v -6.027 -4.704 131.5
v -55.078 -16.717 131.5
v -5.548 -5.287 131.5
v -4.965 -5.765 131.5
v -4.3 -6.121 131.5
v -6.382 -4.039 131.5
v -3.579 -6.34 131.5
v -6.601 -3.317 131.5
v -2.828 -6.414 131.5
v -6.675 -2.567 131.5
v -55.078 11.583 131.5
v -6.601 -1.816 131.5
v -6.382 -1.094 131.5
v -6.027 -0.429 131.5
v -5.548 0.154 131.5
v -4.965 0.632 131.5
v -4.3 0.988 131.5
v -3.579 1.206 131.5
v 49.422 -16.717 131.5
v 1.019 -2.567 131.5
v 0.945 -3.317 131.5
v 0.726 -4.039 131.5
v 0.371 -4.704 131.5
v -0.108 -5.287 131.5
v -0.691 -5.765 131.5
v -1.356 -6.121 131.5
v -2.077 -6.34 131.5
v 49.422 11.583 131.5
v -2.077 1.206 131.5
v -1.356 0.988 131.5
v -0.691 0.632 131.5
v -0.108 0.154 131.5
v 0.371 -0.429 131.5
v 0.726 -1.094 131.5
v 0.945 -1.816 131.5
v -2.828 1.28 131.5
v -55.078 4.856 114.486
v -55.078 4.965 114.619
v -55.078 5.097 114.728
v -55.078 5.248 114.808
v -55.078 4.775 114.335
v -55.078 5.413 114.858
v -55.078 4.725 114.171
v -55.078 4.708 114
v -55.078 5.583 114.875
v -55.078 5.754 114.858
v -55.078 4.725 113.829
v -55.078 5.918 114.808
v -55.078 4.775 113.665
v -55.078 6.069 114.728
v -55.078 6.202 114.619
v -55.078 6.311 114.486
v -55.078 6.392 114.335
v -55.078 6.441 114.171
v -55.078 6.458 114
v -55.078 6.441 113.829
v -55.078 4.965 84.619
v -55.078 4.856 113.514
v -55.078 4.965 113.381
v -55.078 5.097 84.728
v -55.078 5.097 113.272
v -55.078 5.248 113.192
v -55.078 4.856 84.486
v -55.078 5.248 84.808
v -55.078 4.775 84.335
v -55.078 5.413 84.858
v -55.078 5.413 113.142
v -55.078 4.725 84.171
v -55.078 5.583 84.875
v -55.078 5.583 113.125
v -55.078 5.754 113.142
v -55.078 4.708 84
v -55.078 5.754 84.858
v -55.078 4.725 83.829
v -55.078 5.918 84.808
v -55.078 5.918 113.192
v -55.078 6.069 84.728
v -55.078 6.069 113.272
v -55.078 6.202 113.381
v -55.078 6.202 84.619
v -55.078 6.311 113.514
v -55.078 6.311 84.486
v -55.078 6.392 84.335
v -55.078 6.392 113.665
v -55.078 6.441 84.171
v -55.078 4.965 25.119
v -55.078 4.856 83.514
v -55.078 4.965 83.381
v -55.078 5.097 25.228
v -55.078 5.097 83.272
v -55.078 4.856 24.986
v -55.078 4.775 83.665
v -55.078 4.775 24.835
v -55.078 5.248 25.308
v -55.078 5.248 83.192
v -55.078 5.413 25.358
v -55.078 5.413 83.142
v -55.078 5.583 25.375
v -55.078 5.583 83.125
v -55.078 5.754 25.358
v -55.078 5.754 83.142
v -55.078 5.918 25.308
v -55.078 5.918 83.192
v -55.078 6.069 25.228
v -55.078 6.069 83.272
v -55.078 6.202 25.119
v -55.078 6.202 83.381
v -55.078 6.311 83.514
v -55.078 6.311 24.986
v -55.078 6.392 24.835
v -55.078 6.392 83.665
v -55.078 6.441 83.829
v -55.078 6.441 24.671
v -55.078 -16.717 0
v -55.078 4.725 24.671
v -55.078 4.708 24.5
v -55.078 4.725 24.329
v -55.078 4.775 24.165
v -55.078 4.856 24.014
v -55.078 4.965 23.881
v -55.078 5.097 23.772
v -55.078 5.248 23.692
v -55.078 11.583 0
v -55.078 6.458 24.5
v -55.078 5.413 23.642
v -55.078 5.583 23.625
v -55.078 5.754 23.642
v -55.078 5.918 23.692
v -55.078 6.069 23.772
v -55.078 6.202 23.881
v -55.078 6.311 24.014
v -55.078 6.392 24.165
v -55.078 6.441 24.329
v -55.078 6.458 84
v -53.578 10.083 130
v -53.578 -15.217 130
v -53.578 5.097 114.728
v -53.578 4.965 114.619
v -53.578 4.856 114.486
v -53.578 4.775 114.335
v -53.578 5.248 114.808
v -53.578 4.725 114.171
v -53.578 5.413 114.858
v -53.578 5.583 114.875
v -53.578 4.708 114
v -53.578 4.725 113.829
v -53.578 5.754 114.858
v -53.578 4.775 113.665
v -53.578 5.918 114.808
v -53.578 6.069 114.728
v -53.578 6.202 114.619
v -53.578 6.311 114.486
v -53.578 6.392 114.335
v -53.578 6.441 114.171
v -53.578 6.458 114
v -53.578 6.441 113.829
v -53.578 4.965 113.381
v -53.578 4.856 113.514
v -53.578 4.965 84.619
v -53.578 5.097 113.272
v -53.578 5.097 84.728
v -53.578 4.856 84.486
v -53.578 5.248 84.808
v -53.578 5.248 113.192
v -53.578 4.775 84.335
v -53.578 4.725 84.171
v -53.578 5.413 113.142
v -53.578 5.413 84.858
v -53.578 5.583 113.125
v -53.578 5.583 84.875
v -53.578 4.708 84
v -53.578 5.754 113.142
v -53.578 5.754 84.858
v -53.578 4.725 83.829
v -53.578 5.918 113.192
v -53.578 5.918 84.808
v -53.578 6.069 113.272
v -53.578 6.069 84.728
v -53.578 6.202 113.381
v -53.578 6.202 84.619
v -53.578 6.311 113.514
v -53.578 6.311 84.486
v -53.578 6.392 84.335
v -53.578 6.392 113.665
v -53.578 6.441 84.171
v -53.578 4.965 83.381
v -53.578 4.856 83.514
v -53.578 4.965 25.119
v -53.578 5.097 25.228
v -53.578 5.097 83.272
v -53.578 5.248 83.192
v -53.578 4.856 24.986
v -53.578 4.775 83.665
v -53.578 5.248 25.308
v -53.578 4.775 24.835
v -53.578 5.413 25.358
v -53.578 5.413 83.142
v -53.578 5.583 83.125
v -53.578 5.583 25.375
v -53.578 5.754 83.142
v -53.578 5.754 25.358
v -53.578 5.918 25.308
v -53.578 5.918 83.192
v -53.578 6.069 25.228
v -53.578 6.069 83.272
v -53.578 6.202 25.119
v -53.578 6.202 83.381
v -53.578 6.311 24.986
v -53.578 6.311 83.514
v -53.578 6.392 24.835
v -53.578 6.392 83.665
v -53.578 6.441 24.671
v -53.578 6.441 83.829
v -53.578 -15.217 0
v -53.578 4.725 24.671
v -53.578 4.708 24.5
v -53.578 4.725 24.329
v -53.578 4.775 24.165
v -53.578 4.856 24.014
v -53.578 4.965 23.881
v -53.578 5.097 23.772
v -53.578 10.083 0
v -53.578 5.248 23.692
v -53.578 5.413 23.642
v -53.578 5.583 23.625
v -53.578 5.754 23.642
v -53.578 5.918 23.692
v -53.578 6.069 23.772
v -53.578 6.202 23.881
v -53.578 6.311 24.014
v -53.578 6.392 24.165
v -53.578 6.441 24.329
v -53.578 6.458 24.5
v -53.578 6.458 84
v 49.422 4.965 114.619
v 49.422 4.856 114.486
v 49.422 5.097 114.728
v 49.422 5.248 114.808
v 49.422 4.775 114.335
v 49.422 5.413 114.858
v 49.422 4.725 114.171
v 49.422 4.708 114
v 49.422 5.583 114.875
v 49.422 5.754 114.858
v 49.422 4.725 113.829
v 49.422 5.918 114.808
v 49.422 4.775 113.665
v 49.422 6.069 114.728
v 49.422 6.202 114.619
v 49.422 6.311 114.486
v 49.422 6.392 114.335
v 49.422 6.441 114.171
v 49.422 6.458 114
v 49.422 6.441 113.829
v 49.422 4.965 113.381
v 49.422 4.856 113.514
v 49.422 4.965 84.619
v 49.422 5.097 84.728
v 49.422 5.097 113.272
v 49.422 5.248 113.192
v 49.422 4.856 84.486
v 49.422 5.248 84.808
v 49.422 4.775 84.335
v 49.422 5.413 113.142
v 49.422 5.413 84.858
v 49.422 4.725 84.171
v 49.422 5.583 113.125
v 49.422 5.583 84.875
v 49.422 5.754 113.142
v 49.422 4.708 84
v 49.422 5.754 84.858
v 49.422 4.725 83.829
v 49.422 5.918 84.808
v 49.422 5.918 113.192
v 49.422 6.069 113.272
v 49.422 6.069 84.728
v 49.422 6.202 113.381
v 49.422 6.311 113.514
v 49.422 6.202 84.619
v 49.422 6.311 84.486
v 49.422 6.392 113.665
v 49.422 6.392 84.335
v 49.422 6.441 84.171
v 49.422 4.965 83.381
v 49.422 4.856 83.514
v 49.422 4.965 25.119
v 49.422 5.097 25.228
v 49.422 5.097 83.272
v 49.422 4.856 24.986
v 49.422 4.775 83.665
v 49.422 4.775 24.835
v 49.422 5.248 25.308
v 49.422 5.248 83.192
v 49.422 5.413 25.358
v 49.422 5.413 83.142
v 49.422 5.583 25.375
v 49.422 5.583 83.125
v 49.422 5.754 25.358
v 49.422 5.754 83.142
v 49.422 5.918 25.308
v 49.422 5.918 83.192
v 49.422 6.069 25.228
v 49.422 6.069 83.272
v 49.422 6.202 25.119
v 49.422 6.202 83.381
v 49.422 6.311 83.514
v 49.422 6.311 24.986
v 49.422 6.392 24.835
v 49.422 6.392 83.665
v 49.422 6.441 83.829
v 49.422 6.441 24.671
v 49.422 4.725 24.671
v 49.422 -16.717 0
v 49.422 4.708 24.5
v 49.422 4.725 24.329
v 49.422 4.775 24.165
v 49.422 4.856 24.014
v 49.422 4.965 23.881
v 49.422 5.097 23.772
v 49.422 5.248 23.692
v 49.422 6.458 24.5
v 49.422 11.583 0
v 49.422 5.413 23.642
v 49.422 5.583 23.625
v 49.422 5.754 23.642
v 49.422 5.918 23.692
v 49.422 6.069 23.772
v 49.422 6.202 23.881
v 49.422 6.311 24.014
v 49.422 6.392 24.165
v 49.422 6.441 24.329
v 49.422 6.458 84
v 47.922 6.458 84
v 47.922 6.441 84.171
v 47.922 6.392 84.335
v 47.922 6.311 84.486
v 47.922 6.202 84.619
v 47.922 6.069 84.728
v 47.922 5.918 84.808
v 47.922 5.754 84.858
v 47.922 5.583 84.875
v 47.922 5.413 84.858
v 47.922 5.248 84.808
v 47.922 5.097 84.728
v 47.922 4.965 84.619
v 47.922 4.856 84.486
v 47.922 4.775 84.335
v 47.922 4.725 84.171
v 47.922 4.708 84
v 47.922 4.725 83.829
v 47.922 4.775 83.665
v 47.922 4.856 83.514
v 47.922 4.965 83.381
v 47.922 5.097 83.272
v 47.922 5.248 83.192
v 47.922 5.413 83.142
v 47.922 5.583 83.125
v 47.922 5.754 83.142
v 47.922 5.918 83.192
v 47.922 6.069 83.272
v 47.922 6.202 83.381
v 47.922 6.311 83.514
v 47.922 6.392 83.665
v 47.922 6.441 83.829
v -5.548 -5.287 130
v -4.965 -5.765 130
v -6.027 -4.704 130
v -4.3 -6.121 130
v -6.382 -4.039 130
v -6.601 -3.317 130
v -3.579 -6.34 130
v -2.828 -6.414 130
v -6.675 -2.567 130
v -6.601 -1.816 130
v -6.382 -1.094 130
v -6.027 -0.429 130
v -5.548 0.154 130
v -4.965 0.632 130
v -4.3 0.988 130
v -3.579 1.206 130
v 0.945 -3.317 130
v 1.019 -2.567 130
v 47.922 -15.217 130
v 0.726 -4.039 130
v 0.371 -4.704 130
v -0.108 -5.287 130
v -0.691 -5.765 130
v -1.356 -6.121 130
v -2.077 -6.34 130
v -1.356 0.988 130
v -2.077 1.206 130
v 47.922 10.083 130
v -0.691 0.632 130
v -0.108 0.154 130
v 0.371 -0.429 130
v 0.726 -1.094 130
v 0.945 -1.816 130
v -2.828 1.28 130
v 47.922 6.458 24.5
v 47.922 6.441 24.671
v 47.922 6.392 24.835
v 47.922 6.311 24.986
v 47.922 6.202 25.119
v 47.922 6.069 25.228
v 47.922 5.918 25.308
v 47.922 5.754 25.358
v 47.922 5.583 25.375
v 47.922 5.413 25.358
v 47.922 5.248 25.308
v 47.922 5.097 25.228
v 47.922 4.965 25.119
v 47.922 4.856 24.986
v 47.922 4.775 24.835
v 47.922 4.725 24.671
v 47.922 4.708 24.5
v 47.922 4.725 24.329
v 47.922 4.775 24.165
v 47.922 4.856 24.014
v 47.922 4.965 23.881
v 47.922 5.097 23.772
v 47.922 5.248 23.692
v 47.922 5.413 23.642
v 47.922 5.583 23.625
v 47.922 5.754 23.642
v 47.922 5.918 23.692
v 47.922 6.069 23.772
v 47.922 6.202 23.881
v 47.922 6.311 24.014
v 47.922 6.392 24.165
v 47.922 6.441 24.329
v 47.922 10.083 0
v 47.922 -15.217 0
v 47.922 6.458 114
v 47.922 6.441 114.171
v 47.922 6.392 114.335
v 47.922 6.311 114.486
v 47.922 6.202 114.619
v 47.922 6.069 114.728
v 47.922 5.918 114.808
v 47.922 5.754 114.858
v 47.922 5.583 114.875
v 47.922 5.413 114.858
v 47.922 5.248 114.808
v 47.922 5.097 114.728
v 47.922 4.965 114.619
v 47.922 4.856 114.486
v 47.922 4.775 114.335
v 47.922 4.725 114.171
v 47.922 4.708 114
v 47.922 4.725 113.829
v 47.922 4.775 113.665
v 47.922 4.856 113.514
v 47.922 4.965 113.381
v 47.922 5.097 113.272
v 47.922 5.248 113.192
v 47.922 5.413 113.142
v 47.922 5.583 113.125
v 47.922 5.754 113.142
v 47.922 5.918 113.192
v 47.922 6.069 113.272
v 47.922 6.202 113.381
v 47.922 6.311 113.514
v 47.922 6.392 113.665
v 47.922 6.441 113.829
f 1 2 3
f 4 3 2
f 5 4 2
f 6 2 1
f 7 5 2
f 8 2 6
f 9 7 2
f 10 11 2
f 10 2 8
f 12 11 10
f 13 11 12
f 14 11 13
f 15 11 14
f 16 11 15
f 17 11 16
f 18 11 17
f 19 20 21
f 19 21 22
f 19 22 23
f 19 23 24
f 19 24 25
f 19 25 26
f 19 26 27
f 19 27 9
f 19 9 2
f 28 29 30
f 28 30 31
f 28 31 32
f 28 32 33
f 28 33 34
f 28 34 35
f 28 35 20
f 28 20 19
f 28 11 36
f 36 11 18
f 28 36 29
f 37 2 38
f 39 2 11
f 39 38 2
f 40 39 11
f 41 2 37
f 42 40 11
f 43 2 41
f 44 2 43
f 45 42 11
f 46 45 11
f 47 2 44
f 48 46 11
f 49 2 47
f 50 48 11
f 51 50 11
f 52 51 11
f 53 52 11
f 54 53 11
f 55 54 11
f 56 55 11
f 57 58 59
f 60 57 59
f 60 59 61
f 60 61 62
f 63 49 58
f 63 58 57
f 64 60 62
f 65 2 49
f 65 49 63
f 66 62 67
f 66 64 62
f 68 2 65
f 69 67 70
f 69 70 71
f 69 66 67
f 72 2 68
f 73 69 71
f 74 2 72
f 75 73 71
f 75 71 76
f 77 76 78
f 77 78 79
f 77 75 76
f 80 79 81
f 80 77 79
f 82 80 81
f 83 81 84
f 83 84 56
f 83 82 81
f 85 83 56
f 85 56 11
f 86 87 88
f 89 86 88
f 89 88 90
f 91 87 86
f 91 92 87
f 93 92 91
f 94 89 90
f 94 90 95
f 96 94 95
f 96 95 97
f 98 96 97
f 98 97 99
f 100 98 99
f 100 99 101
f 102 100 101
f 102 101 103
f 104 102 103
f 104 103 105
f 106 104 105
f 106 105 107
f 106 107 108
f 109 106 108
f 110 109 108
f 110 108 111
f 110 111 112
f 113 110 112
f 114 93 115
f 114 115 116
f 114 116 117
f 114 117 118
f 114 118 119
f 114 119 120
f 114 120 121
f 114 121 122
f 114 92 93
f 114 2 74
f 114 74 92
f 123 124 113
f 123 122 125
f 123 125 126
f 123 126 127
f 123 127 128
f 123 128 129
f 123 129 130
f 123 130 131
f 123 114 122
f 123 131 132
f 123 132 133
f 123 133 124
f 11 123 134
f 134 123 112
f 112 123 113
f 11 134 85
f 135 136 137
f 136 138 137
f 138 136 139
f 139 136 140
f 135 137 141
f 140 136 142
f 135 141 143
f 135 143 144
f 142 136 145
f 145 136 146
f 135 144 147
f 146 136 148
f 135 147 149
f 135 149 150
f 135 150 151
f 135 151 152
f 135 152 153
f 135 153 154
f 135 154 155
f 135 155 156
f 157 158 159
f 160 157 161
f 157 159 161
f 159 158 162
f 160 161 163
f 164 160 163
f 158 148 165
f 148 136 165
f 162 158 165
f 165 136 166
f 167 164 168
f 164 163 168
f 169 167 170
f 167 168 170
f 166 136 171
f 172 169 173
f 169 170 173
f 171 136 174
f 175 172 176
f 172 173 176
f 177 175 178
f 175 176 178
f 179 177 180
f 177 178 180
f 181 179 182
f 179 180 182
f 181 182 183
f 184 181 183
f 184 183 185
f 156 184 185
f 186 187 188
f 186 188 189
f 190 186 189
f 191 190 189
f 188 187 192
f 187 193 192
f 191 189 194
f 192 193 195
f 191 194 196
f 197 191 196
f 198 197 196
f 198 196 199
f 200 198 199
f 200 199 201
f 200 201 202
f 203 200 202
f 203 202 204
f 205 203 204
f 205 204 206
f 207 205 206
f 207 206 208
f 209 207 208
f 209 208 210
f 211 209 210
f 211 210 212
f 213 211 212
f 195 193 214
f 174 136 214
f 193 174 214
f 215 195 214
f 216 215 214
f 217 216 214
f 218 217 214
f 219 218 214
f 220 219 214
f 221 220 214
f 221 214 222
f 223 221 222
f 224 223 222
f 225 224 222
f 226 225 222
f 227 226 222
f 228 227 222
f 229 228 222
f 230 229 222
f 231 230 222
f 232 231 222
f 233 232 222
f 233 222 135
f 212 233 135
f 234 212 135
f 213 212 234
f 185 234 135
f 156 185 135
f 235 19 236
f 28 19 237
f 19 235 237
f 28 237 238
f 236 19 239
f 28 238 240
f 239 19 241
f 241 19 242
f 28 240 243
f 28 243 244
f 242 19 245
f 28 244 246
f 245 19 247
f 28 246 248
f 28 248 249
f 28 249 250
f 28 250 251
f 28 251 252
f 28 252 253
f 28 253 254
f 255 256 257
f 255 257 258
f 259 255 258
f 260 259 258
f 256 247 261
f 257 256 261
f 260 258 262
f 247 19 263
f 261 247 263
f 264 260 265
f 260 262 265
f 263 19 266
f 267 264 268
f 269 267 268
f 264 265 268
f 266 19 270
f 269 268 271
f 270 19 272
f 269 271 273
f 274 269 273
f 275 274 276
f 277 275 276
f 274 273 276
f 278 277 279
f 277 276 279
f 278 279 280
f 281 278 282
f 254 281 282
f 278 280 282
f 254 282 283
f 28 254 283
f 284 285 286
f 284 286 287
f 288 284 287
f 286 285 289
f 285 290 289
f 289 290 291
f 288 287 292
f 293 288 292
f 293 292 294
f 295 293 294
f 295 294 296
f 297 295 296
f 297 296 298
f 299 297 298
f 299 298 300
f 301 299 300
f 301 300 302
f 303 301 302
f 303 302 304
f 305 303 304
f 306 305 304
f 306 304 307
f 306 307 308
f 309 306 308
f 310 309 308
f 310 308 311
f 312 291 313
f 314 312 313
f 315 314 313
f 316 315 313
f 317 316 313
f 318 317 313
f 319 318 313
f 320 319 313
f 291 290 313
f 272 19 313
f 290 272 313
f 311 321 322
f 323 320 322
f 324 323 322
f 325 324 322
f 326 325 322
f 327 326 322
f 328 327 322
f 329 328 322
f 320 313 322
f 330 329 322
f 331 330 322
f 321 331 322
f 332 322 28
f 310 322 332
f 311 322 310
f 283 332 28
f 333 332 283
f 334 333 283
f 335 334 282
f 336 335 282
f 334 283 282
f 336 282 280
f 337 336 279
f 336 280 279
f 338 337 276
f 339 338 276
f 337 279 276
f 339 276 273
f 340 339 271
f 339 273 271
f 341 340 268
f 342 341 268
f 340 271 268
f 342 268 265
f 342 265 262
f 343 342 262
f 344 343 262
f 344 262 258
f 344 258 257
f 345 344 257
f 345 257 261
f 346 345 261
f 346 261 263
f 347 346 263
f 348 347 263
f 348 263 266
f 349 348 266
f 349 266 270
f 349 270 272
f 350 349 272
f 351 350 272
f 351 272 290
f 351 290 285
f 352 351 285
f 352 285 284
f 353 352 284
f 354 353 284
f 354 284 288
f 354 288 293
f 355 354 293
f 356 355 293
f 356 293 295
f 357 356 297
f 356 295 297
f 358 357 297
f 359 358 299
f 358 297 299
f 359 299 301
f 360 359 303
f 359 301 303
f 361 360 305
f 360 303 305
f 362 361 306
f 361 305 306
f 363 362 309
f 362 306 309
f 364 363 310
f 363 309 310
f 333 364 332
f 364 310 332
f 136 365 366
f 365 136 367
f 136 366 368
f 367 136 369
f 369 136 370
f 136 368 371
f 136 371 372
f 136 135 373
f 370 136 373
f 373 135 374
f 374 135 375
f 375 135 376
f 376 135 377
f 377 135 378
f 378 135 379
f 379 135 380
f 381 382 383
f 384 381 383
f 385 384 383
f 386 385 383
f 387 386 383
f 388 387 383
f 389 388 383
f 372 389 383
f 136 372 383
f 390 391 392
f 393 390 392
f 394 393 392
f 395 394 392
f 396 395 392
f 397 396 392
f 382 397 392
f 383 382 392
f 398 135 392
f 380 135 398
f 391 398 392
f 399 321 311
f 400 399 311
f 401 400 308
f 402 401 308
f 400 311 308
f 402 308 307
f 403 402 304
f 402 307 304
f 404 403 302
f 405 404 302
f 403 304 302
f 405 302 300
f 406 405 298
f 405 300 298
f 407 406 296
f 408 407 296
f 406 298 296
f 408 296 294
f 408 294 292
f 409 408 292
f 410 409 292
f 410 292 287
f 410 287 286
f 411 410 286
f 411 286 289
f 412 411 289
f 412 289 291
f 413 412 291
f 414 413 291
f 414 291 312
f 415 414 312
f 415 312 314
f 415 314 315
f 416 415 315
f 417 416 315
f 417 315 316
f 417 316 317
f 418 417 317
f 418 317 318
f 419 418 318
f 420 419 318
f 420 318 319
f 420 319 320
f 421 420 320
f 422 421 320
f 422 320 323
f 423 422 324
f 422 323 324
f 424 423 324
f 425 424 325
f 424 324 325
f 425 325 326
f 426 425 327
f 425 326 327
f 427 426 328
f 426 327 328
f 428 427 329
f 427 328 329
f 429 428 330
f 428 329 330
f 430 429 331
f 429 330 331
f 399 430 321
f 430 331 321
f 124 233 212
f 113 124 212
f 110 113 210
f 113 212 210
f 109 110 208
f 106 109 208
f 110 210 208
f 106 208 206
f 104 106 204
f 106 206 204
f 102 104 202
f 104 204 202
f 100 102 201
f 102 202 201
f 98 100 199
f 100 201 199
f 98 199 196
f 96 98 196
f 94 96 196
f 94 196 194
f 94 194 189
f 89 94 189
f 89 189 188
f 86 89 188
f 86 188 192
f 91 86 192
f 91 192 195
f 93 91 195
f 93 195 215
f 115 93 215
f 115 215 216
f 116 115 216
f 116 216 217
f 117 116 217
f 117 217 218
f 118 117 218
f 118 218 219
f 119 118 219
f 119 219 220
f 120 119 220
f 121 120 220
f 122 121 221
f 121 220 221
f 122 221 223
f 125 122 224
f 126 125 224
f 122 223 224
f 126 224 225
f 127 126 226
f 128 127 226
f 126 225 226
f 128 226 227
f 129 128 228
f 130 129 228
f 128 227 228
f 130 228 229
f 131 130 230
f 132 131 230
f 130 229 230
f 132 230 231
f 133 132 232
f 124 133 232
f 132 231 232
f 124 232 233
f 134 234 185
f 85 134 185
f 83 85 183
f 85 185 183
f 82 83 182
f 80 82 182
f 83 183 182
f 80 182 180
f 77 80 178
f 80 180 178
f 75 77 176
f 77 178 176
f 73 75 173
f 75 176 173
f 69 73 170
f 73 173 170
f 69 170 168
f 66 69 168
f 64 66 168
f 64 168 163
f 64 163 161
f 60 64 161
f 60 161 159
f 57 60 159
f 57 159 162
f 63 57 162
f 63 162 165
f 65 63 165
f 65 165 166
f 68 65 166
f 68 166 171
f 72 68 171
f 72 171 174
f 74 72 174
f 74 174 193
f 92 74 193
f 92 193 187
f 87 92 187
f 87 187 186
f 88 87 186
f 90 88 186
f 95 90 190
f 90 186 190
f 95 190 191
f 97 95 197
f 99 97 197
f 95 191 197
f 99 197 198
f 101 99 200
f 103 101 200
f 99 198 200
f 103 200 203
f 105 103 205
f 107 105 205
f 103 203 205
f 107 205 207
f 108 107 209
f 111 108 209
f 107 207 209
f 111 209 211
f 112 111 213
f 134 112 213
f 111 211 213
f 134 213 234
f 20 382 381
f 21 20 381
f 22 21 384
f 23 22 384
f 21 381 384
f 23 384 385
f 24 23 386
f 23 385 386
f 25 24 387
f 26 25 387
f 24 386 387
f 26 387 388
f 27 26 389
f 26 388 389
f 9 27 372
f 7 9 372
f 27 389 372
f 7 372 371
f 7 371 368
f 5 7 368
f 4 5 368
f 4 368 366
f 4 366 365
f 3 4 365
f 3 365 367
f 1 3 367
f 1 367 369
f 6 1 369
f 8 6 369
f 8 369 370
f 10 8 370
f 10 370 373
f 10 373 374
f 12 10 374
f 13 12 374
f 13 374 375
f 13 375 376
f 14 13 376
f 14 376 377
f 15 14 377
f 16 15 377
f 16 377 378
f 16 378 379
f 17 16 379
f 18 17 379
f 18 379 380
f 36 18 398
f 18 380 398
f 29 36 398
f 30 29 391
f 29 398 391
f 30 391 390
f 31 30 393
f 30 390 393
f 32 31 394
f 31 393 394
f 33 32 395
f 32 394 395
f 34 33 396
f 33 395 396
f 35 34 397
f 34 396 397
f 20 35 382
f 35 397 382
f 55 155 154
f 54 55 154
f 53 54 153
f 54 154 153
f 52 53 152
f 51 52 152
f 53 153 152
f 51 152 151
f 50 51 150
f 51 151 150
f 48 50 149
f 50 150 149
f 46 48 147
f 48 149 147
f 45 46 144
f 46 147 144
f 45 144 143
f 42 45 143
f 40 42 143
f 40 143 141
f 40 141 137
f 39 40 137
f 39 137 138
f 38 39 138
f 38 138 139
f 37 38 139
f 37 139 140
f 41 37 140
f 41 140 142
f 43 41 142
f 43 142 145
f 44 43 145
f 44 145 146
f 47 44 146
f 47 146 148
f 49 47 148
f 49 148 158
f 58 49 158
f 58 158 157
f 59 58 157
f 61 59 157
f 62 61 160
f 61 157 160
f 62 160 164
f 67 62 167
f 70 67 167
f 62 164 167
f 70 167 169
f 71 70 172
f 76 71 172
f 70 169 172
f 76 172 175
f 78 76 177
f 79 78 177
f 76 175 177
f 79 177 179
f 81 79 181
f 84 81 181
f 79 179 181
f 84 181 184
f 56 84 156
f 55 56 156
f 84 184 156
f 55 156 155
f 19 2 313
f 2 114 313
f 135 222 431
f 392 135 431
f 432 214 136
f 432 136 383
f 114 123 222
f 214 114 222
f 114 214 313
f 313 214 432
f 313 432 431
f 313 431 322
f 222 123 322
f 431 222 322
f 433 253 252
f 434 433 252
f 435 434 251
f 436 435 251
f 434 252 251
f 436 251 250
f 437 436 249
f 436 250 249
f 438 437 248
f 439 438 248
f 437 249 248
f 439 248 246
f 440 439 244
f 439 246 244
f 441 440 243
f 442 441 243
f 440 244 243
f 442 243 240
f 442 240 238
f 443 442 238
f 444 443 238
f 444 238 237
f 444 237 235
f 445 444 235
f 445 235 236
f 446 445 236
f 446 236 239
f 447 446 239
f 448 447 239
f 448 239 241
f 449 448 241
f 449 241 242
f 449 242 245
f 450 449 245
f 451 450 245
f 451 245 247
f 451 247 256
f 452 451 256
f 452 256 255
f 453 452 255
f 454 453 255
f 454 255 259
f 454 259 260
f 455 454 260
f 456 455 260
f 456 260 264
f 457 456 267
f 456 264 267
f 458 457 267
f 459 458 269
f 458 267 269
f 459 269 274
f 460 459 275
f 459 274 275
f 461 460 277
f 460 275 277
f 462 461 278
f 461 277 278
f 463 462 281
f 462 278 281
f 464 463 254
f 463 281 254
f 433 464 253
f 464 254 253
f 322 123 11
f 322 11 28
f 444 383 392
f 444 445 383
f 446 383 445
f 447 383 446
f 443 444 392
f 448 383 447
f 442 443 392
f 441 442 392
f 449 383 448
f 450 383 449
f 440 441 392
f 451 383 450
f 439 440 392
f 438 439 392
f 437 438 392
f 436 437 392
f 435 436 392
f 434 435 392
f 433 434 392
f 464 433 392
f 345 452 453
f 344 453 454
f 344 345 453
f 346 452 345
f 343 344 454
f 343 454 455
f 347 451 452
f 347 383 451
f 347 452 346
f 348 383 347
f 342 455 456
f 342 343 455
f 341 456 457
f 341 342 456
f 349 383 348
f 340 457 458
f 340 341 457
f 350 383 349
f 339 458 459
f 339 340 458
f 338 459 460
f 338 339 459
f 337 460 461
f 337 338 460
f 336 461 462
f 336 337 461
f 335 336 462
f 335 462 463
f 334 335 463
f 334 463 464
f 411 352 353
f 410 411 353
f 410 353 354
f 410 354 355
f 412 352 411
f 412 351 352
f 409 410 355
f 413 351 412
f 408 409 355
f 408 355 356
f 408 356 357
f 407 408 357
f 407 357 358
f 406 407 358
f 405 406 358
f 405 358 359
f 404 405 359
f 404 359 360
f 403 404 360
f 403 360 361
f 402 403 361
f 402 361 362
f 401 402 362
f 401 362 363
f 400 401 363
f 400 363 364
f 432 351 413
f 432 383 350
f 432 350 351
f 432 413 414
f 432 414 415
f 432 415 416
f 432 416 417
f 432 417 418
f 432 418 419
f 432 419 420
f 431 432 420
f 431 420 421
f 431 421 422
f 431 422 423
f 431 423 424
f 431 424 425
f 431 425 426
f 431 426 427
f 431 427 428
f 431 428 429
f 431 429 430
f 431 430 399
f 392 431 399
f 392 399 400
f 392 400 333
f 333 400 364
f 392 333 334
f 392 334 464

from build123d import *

# Parameters (mm, degrees)
F0_W     = 104.5
F0_H     = 28.3
F0_W_2   = 101.5
F0_H_2   = 25.3
F1_DEPTH = 130
F2_R     = 0.875
F3_DEPTH = 130
F4_W     = 104.5
F4_H     = 28.3
F5_DEPTH = 1.5
F6_R     = 3.847092
F7_DEPTH = 3


with BuildPart() as f1:
    # F0 (on Top) → F1 (new body)
    with BuildSketch(Plane.XY):
        with Locations((-2.827974, -2.56671)):
            Rectangle(F0_W, F0_H)
        with Locations((-2.827974, -2.56671)):
            Rectangle(F0_W_2, F0_H_2, mode=Mode.SUBTRACT)
    extrude(amount=F1_DEPTH)

    # F2 (on face) → F3 (cut)
    with BuildSketch(Plane.YZ.offset(49.422026)):
        with Locations((5.58329, 114)):
            Circle(F2_R)
        with Locations((5.58329, 84)):
            Circle(F2_R)
        with Locations((5.58329, 24.5)):
            Circle(F2_R)
    extrude(amount=-F3_DEPTH, mode=Mode.SUBTRACT)

    # F4 (on face) → F5 (join)
    with BuildSketch(Plane.XY.offset(130)):
        with Locations((-2.827974, -2.56671)):
            Rectangle(F4_W, F4_H)
    extrude(amount=F5_DEPTH)

    # F6 (on face) → F7 (cut)
    with BuildSketch(Plane(origin=(0, 0, 130), x_dir=(1, 0, 0), z_dir=(0, 0, -1))):
        with Locations((-2.827974, 2.56671)):
            Circle(F6_R)
    extrude(amount=-F7_DEPTH, mode=Mode.SUBTRACT)


solid = f1.part
